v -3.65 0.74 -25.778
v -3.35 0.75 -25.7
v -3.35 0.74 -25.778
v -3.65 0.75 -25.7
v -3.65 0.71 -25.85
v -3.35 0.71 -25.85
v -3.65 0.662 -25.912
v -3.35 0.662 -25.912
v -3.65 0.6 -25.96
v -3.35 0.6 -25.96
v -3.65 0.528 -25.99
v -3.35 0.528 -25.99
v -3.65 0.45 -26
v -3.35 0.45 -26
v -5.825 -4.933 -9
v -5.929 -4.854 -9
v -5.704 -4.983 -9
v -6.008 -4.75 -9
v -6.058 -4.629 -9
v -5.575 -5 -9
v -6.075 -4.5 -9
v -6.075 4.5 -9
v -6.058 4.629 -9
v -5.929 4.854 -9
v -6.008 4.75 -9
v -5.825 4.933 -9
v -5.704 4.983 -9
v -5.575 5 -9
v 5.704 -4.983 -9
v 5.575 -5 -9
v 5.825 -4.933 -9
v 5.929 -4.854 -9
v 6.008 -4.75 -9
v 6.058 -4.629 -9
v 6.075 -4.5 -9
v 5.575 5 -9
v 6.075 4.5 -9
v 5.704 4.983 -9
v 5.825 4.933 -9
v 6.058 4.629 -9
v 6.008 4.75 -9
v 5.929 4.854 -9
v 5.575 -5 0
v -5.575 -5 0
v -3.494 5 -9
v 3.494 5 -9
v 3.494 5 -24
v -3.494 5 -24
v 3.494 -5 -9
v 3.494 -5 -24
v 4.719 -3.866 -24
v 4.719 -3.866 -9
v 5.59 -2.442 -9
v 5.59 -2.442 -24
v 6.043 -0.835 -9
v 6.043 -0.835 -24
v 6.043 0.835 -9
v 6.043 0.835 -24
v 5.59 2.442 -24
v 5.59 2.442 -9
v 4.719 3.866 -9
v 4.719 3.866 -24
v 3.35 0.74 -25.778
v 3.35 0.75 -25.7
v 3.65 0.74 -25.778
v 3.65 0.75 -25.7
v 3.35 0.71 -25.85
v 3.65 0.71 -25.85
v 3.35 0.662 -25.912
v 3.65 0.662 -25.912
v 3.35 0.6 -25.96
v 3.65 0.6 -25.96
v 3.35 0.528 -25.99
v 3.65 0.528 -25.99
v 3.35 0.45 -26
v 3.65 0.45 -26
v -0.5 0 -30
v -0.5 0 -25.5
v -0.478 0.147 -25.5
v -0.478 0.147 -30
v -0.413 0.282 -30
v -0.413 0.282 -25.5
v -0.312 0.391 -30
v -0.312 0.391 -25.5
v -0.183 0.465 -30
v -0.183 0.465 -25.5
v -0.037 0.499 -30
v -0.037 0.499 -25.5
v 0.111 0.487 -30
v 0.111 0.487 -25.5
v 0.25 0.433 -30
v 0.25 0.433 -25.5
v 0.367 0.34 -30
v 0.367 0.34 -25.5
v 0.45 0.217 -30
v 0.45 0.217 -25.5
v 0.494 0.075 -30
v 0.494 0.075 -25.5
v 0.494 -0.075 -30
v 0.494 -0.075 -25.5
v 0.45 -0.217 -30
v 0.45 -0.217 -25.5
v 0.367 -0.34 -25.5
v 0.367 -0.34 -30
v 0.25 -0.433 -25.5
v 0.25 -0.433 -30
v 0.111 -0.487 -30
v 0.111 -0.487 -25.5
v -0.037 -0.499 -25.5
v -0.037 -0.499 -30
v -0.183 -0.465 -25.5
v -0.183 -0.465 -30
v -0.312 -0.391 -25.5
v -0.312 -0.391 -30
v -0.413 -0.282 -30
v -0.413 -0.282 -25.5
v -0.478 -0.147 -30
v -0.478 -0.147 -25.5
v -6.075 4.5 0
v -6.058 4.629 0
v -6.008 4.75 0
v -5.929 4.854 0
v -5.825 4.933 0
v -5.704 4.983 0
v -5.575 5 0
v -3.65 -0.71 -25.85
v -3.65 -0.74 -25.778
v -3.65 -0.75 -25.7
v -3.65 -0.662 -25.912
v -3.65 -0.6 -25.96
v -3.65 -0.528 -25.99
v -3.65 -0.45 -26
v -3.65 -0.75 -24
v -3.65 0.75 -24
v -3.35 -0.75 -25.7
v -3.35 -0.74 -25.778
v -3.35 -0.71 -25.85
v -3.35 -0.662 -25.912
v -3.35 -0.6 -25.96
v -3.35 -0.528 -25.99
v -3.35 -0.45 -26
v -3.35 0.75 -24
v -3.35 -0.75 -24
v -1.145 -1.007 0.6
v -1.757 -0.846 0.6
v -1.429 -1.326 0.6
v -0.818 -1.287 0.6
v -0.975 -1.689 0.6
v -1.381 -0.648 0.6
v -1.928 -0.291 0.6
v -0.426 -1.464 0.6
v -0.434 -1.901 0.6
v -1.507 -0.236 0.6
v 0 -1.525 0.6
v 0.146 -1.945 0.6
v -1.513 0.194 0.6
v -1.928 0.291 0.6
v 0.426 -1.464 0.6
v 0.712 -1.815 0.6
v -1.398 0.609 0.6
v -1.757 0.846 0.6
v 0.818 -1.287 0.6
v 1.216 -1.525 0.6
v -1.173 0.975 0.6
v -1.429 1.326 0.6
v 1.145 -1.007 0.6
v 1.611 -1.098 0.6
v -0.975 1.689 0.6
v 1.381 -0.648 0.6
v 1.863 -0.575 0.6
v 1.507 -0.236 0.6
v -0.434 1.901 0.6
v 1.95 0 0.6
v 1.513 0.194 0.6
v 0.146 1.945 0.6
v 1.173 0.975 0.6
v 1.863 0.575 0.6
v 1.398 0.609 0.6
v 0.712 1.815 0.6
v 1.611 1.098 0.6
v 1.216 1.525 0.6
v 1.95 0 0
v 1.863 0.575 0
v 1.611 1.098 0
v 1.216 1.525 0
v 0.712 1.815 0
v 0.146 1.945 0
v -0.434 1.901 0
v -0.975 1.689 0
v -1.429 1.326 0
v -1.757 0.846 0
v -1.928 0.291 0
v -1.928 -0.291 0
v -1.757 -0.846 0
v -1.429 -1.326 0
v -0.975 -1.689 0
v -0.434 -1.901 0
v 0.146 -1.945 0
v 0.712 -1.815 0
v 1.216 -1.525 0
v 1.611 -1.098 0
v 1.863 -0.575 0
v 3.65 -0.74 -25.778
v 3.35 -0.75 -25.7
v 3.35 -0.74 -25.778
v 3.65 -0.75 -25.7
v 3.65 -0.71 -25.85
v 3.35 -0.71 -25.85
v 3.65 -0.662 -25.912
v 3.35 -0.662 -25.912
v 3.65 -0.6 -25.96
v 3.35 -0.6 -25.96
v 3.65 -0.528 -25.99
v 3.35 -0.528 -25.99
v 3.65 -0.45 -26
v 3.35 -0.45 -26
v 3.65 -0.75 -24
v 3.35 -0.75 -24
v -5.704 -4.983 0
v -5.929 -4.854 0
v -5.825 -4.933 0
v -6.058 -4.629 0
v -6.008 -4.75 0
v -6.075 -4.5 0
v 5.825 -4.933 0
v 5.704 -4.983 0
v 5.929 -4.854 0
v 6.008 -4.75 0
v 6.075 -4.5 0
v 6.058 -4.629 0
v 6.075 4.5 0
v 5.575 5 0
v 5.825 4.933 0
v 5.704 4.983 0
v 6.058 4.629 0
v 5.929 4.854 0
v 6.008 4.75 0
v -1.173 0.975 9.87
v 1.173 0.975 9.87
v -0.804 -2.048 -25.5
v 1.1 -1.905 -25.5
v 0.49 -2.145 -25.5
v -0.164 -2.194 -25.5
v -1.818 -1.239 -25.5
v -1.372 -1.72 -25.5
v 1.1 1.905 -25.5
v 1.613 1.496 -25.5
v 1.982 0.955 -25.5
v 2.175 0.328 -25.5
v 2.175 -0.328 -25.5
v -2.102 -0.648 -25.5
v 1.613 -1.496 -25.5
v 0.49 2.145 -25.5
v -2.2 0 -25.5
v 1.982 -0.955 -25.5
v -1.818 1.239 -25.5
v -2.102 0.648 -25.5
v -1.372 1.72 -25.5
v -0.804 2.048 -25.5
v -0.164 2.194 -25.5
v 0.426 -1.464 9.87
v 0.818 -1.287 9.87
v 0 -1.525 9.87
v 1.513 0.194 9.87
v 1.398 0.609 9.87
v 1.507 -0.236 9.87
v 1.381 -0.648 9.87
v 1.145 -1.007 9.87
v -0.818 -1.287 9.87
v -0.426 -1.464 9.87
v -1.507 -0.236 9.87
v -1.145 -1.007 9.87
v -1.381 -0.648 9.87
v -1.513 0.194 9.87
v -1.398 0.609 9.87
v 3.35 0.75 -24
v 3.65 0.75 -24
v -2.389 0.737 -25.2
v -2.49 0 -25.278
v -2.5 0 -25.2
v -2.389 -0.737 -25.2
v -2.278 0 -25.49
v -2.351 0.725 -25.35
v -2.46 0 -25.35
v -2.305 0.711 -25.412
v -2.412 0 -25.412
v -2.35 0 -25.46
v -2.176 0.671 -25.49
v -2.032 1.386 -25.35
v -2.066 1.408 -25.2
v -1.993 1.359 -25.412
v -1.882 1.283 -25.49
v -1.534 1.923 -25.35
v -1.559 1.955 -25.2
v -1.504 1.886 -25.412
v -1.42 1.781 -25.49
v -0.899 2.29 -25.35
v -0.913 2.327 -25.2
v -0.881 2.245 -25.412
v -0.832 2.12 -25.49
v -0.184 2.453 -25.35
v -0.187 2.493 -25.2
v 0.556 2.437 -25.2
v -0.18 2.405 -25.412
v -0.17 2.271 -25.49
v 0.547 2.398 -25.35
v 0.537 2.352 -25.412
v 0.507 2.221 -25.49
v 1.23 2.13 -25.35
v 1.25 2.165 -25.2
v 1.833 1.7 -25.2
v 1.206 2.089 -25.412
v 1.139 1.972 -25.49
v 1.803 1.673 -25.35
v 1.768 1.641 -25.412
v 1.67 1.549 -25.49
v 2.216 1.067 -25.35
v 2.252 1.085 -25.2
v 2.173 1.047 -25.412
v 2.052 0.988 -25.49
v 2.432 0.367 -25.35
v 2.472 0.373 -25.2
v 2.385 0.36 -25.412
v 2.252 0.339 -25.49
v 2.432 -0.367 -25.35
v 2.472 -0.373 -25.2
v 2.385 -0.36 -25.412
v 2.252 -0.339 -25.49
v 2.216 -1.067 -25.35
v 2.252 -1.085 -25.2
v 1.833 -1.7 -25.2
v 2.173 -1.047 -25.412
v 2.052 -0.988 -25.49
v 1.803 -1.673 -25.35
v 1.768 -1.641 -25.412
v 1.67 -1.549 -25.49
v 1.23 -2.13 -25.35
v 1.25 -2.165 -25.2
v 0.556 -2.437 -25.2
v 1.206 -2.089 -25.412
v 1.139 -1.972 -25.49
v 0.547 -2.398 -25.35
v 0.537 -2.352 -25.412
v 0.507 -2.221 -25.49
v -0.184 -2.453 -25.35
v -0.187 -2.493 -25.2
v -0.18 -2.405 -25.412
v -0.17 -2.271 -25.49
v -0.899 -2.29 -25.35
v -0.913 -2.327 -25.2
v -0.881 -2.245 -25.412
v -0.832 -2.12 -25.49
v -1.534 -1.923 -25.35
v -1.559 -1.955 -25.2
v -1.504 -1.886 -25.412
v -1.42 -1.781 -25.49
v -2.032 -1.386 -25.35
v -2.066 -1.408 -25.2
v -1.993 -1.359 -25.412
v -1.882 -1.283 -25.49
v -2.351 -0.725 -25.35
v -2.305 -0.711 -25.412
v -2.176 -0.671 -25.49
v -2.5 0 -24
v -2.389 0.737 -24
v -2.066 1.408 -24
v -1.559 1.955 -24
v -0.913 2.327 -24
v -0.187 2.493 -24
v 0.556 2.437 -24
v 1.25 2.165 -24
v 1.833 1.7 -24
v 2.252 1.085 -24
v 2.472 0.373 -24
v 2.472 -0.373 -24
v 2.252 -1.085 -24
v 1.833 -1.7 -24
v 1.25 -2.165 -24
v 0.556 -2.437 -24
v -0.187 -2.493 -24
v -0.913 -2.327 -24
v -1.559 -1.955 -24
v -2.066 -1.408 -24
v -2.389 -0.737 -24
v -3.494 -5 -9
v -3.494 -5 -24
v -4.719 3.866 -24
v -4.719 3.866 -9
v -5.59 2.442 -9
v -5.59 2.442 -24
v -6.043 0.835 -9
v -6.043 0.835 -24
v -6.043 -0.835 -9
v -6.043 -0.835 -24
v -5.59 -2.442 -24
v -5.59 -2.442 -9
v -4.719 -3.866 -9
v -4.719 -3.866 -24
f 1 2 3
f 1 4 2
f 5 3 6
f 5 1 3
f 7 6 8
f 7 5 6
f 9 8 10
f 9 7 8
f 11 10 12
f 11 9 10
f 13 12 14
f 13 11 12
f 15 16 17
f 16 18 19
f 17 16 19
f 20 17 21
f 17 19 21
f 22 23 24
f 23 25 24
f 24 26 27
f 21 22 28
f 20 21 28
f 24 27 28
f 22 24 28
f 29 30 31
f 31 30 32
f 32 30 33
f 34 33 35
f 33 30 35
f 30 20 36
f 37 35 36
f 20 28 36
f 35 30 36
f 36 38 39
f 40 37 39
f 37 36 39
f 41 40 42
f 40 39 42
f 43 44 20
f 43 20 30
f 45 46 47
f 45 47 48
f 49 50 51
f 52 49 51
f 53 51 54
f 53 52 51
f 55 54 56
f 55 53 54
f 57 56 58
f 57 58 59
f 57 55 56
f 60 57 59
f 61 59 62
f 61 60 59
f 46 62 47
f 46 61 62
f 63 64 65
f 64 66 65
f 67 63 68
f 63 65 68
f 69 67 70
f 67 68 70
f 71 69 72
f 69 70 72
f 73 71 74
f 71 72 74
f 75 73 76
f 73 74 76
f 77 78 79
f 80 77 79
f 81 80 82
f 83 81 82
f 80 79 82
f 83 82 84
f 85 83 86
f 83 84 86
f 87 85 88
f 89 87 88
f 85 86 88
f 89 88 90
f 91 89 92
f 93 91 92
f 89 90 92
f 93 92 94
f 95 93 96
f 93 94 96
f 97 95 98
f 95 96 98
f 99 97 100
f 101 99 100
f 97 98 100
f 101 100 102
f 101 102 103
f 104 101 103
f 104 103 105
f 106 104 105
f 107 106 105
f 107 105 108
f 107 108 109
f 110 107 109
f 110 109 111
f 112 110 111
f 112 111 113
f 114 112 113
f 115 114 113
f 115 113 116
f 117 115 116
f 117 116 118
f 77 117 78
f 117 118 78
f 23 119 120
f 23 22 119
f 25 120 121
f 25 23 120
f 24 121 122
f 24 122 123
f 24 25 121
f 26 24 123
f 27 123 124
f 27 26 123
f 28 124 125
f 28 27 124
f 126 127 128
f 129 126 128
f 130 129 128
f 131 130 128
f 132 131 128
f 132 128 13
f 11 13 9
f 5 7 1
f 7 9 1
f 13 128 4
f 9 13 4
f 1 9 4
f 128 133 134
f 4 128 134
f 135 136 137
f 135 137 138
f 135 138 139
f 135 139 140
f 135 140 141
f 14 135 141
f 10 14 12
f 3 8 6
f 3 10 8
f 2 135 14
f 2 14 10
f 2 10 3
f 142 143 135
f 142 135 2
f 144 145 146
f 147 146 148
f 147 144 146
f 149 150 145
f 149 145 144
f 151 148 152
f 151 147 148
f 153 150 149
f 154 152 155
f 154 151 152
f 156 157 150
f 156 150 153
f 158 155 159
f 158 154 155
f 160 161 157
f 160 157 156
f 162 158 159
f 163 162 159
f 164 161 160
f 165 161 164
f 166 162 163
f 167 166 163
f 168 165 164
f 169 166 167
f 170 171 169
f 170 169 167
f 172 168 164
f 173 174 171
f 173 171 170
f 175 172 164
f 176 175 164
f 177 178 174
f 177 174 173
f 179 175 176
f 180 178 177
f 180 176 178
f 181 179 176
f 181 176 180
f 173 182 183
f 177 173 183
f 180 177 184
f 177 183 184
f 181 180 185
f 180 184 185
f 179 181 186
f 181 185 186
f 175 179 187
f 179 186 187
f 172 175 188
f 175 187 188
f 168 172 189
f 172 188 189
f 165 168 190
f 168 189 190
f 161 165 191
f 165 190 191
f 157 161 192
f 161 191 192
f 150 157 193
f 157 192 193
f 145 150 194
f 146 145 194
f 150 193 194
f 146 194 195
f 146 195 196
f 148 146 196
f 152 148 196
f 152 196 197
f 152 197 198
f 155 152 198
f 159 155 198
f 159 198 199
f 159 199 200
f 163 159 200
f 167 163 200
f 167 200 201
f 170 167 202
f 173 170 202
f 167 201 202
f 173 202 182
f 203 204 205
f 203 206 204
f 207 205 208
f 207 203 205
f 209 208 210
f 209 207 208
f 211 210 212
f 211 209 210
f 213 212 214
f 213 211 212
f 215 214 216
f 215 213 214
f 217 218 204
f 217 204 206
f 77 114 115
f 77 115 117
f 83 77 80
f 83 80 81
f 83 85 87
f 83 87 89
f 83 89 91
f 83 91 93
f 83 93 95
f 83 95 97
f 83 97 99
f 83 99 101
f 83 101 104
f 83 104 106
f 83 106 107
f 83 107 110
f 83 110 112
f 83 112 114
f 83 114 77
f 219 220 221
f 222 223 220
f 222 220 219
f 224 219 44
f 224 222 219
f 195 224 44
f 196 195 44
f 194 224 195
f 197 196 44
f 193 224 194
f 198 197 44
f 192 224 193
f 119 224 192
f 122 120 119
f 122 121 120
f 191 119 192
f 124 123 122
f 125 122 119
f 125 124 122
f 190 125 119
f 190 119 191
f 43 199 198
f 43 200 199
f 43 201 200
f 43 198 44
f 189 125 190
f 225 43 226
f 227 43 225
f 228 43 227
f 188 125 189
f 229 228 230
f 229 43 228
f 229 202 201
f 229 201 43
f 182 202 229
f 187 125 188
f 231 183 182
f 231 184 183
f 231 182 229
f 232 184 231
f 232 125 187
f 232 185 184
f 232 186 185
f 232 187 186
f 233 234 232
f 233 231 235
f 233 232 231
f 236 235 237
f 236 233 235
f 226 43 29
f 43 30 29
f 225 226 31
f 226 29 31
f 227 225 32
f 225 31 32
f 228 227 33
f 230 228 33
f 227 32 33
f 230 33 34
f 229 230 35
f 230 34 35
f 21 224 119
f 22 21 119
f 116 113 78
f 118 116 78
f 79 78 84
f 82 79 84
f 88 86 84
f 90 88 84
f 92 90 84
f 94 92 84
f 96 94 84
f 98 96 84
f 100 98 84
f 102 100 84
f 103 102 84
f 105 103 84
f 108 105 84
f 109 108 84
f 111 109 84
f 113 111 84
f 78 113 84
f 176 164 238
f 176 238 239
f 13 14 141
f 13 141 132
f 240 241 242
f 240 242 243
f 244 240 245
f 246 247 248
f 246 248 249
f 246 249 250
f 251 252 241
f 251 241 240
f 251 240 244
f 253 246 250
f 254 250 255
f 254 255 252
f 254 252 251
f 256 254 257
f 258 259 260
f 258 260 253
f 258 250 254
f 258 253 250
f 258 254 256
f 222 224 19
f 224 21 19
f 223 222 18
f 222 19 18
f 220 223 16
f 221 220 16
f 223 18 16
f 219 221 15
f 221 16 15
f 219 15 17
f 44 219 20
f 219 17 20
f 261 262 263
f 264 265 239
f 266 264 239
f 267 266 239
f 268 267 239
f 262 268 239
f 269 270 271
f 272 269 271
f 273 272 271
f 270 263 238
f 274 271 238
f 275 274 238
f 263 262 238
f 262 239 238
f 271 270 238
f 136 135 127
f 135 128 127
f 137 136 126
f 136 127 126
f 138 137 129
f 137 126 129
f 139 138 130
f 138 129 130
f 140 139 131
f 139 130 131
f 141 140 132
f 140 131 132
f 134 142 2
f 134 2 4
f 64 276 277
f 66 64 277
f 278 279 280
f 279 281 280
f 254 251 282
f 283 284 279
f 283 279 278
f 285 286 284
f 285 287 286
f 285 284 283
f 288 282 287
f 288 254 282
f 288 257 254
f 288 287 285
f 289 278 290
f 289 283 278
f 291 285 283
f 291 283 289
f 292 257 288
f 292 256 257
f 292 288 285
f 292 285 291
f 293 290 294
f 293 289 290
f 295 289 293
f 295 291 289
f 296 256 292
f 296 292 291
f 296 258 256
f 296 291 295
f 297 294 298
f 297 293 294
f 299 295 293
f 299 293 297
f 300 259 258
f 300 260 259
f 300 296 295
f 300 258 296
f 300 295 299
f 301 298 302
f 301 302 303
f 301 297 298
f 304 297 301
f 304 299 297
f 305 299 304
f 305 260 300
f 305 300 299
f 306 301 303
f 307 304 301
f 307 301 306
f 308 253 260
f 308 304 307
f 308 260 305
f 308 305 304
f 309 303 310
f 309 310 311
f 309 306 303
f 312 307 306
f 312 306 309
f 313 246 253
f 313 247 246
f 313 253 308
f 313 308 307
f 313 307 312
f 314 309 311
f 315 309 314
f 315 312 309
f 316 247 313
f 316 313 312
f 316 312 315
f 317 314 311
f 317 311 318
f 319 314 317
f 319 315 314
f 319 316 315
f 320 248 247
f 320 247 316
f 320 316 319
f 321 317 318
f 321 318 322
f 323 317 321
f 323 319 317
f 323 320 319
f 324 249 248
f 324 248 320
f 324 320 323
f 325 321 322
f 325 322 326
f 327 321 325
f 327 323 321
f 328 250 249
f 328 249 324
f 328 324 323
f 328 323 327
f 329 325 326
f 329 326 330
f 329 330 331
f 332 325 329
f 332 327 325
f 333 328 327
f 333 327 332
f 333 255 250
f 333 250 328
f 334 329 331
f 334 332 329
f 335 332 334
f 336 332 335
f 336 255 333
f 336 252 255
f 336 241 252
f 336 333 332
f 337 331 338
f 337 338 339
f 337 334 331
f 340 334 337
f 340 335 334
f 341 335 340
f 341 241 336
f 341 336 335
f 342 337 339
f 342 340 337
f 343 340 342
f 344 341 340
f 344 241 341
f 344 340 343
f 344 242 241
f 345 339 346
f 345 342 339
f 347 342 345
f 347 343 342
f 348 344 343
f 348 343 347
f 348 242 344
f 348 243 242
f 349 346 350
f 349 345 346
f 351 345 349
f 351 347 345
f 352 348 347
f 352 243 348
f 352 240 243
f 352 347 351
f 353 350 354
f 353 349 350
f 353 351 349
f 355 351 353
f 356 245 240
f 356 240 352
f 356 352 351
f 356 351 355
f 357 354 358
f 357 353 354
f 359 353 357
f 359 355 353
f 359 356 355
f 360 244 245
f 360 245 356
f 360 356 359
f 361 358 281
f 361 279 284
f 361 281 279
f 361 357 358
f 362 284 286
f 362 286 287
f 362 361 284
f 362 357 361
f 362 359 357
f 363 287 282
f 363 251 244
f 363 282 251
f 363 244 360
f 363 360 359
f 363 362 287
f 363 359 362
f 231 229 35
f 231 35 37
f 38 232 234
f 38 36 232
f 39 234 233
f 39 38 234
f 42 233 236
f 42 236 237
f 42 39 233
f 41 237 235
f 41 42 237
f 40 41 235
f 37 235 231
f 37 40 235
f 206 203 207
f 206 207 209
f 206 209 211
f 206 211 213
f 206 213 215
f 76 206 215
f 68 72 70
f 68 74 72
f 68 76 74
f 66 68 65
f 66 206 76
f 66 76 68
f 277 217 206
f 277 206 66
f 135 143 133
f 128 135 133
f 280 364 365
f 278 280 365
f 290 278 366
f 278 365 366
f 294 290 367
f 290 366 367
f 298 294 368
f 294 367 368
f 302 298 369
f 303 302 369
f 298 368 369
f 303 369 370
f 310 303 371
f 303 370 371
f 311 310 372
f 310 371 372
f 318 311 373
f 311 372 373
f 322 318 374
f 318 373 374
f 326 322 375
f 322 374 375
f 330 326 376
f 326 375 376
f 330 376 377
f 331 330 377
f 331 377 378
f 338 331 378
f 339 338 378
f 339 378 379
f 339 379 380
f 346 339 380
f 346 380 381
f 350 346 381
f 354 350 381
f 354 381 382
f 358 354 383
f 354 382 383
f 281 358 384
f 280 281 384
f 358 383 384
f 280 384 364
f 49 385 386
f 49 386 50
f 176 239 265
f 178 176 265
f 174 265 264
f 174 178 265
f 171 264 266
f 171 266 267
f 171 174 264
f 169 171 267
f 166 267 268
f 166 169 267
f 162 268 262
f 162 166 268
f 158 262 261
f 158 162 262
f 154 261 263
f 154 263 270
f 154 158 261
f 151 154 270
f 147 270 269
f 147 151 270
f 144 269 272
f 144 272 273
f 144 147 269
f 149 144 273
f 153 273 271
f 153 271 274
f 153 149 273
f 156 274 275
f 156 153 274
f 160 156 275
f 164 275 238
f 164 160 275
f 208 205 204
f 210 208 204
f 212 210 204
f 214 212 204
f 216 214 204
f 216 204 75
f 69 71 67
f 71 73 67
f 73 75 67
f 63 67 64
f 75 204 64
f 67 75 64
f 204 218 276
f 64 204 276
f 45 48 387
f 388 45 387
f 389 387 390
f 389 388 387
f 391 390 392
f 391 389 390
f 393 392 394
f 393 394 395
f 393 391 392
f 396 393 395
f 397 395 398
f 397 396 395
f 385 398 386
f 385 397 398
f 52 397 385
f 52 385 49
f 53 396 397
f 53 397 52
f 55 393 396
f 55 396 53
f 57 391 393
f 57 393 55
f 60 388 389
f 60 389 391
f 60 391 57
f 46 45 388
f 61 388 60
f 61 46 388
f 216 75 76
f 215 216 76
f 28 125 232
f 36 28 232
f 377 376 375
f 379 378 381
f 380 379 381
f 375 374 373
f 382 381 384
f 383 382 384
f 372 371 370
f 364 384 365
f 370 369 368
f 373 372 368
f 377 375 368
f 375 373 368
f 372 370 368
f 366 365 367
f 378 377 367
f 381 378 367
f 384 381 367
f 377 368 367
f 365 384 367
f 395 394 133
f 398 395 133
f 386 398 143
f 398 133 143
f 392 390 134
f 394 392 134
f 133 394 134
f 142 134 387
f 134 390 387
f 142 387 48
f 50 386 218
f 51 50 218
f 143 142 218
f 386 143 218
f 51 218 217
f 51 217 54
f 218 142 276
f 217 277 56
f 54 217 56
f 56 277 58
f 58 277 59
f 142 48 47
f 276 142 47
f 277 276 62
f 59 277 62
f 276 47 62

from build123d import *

# Parameters (mm, degrees)
SKETCH1_W            = 12.15
SKETCH1_H            = 10
EXTRUDE2_DEPTH       = 9
SKETCH11_R           = 1.95
EXTRUDE5_DEPTH       = 0.6
EXTRUDE6_DEPTH       = 9.27
EXTRUDE7_DEPTH       = 15
SKETCH14_R           = 2.5
EXTRUDE8_DEPTH       = 1.5
SKETCH16_W           = 0.3
SKETCH16_H           = 1.5
EXTRUDE10_DEPTH      = 2
FILLET1_R            = 0.3
FILLET2_R            = 0.5
FILLET3_R            = 0.3
SKETCH17_R           = 0.5
EXTRUDE11_DEPTH      = 4.5
FILLET1_OF_MIRROR2_R = 0.3


with BuildPart() as part:
    # Sketch1 → Extrude2 (new body)
    with BuildSketch(Plane.XY):
        Rectangle(SKETCH1_W, SKETCH1_H)
    extrude(amount=-EXTRUDE2_DEPTH)

    # Sketch11 → Extrude5 (add)
    with BuildSketch(Plane.XY):
        Circle(SKETCH11_R)
    extrude(amount=EXTRUDE5_DEPTH)

    # Sketch12 → Extrude6 (add)
    with BuildSketch(Plane.XY.offset(0.6)):
        with BuildLine():
            Line((-1.17260394, 0.975), (1.17260394, 0.975))
            ThreePointArc((1.17260394, 0.975), (0, -1.525), (-1.17260394, 0.975))
        make_face()
    extrude(amount=EXTRUDE6_DEPTH)

    # Fillet2
    fillet2_edges = [part.edges().sort_by_distance(p)[0] for p in [
        (-6.075, 5, -4.5),
        (6.075, 5, -4.5),
        (6.075, -5, -4.5),
        (-6.075, -5, -4.5),
    ]]
    fillet(fillet2_edges, radius=FILLET2_R)


with BuildPart() as body_2:
    # Sketch13 → Extrude7 (new body)
    with BuildSketch(Plane(origin=(0, 0, -9), x_dir=(-1, 0, 0), z_dir=(0, 0, -1))):
        with BuildLine():
            Line((-3.494281042, 5), (3.494281042, 5))
            ThreePointArc((3.494281042, 5), (6.1, 0), (3.494281042, -5))
            Line((3.494281042, -5), (-3.494281042, -5))
            ThreePointArc((-3.494281042, -5), (-6.1, 0), (-3.494281042, 5))
        make_face()
    extrude(amount=EXTRUDE7_DEPTH)

    # Sketch16 → Extrude10 (add)
    with BuildSketch(Plane(origin=(0, 0, -24), x_dir=(-1, 0, 0), z_dir=(0, 0, -1))):
        with Locations((3.5, 0)):
            Rectangle(SKETCH16_W, SKETCH16_H)
    extrude10 = extrude(amount=EXTRUDE10_DEPTH)

    # Fillet1
    fillet1_edges = [body_2.edges().sort_by_distance(p)[0] for p in [
        (-3.5, -0.75, -26),
        (-3.5, 0.75, -26),
    ]]
    fillet(fillet1_edges, radius=FILLET1_R)

    # Mirror2: Extrude10 across plane
    add(extrude10.mirror(Plane(origin=(0, 0, 0), x_dir=(0, 0, 1), z_dir=(1, 0, 0))))

    # Fillet1 of Mirror2
    fillet1_of_mirror2_edges = [body_2.edges().sort_by_distance(p)[0] for p in [
        (3.5, -0.75, -26),
        (3.5, 0.75, -26),
    ]]
    fillet(fillet1_of_mirror2_edges, radius=FILLET1_OF_MIRROR2_R)


with BuildPart() as body_3:
    # Sketch14 → Extrude8 (new body)
    with BuildSketch(Plane(origin=(0, 0, -24), x_dir=(-1, 0, 0), z_dir=(0, 0, -1))):
        Circle(SKETCH14_R)
    extrude(amount=EXTRUDE8_DEPTH)

    # Fillet3
    fillet3_edges = [body_3.edges().sort_by_distance(p)[0] for p in [
        (2.5, 0, -25.5),
    ]]
    fillet(fillet3_edges, radius=FILLET3_R)


with BuildPart() as body_4:
    # Sketch17 → Extrude11 (new body)
    with BuildSketch(Plane(origin=(0, 0, -25.5), x_dir=(-1, 0, 0), z_dir=(0, 0, -1))):
        Circle(SKETCH17_R)
    extrude(amount=EXTRUDE11_DEPTH)


solid = Compound([part.part, body_2.part, body_3.part, body_4.part])
